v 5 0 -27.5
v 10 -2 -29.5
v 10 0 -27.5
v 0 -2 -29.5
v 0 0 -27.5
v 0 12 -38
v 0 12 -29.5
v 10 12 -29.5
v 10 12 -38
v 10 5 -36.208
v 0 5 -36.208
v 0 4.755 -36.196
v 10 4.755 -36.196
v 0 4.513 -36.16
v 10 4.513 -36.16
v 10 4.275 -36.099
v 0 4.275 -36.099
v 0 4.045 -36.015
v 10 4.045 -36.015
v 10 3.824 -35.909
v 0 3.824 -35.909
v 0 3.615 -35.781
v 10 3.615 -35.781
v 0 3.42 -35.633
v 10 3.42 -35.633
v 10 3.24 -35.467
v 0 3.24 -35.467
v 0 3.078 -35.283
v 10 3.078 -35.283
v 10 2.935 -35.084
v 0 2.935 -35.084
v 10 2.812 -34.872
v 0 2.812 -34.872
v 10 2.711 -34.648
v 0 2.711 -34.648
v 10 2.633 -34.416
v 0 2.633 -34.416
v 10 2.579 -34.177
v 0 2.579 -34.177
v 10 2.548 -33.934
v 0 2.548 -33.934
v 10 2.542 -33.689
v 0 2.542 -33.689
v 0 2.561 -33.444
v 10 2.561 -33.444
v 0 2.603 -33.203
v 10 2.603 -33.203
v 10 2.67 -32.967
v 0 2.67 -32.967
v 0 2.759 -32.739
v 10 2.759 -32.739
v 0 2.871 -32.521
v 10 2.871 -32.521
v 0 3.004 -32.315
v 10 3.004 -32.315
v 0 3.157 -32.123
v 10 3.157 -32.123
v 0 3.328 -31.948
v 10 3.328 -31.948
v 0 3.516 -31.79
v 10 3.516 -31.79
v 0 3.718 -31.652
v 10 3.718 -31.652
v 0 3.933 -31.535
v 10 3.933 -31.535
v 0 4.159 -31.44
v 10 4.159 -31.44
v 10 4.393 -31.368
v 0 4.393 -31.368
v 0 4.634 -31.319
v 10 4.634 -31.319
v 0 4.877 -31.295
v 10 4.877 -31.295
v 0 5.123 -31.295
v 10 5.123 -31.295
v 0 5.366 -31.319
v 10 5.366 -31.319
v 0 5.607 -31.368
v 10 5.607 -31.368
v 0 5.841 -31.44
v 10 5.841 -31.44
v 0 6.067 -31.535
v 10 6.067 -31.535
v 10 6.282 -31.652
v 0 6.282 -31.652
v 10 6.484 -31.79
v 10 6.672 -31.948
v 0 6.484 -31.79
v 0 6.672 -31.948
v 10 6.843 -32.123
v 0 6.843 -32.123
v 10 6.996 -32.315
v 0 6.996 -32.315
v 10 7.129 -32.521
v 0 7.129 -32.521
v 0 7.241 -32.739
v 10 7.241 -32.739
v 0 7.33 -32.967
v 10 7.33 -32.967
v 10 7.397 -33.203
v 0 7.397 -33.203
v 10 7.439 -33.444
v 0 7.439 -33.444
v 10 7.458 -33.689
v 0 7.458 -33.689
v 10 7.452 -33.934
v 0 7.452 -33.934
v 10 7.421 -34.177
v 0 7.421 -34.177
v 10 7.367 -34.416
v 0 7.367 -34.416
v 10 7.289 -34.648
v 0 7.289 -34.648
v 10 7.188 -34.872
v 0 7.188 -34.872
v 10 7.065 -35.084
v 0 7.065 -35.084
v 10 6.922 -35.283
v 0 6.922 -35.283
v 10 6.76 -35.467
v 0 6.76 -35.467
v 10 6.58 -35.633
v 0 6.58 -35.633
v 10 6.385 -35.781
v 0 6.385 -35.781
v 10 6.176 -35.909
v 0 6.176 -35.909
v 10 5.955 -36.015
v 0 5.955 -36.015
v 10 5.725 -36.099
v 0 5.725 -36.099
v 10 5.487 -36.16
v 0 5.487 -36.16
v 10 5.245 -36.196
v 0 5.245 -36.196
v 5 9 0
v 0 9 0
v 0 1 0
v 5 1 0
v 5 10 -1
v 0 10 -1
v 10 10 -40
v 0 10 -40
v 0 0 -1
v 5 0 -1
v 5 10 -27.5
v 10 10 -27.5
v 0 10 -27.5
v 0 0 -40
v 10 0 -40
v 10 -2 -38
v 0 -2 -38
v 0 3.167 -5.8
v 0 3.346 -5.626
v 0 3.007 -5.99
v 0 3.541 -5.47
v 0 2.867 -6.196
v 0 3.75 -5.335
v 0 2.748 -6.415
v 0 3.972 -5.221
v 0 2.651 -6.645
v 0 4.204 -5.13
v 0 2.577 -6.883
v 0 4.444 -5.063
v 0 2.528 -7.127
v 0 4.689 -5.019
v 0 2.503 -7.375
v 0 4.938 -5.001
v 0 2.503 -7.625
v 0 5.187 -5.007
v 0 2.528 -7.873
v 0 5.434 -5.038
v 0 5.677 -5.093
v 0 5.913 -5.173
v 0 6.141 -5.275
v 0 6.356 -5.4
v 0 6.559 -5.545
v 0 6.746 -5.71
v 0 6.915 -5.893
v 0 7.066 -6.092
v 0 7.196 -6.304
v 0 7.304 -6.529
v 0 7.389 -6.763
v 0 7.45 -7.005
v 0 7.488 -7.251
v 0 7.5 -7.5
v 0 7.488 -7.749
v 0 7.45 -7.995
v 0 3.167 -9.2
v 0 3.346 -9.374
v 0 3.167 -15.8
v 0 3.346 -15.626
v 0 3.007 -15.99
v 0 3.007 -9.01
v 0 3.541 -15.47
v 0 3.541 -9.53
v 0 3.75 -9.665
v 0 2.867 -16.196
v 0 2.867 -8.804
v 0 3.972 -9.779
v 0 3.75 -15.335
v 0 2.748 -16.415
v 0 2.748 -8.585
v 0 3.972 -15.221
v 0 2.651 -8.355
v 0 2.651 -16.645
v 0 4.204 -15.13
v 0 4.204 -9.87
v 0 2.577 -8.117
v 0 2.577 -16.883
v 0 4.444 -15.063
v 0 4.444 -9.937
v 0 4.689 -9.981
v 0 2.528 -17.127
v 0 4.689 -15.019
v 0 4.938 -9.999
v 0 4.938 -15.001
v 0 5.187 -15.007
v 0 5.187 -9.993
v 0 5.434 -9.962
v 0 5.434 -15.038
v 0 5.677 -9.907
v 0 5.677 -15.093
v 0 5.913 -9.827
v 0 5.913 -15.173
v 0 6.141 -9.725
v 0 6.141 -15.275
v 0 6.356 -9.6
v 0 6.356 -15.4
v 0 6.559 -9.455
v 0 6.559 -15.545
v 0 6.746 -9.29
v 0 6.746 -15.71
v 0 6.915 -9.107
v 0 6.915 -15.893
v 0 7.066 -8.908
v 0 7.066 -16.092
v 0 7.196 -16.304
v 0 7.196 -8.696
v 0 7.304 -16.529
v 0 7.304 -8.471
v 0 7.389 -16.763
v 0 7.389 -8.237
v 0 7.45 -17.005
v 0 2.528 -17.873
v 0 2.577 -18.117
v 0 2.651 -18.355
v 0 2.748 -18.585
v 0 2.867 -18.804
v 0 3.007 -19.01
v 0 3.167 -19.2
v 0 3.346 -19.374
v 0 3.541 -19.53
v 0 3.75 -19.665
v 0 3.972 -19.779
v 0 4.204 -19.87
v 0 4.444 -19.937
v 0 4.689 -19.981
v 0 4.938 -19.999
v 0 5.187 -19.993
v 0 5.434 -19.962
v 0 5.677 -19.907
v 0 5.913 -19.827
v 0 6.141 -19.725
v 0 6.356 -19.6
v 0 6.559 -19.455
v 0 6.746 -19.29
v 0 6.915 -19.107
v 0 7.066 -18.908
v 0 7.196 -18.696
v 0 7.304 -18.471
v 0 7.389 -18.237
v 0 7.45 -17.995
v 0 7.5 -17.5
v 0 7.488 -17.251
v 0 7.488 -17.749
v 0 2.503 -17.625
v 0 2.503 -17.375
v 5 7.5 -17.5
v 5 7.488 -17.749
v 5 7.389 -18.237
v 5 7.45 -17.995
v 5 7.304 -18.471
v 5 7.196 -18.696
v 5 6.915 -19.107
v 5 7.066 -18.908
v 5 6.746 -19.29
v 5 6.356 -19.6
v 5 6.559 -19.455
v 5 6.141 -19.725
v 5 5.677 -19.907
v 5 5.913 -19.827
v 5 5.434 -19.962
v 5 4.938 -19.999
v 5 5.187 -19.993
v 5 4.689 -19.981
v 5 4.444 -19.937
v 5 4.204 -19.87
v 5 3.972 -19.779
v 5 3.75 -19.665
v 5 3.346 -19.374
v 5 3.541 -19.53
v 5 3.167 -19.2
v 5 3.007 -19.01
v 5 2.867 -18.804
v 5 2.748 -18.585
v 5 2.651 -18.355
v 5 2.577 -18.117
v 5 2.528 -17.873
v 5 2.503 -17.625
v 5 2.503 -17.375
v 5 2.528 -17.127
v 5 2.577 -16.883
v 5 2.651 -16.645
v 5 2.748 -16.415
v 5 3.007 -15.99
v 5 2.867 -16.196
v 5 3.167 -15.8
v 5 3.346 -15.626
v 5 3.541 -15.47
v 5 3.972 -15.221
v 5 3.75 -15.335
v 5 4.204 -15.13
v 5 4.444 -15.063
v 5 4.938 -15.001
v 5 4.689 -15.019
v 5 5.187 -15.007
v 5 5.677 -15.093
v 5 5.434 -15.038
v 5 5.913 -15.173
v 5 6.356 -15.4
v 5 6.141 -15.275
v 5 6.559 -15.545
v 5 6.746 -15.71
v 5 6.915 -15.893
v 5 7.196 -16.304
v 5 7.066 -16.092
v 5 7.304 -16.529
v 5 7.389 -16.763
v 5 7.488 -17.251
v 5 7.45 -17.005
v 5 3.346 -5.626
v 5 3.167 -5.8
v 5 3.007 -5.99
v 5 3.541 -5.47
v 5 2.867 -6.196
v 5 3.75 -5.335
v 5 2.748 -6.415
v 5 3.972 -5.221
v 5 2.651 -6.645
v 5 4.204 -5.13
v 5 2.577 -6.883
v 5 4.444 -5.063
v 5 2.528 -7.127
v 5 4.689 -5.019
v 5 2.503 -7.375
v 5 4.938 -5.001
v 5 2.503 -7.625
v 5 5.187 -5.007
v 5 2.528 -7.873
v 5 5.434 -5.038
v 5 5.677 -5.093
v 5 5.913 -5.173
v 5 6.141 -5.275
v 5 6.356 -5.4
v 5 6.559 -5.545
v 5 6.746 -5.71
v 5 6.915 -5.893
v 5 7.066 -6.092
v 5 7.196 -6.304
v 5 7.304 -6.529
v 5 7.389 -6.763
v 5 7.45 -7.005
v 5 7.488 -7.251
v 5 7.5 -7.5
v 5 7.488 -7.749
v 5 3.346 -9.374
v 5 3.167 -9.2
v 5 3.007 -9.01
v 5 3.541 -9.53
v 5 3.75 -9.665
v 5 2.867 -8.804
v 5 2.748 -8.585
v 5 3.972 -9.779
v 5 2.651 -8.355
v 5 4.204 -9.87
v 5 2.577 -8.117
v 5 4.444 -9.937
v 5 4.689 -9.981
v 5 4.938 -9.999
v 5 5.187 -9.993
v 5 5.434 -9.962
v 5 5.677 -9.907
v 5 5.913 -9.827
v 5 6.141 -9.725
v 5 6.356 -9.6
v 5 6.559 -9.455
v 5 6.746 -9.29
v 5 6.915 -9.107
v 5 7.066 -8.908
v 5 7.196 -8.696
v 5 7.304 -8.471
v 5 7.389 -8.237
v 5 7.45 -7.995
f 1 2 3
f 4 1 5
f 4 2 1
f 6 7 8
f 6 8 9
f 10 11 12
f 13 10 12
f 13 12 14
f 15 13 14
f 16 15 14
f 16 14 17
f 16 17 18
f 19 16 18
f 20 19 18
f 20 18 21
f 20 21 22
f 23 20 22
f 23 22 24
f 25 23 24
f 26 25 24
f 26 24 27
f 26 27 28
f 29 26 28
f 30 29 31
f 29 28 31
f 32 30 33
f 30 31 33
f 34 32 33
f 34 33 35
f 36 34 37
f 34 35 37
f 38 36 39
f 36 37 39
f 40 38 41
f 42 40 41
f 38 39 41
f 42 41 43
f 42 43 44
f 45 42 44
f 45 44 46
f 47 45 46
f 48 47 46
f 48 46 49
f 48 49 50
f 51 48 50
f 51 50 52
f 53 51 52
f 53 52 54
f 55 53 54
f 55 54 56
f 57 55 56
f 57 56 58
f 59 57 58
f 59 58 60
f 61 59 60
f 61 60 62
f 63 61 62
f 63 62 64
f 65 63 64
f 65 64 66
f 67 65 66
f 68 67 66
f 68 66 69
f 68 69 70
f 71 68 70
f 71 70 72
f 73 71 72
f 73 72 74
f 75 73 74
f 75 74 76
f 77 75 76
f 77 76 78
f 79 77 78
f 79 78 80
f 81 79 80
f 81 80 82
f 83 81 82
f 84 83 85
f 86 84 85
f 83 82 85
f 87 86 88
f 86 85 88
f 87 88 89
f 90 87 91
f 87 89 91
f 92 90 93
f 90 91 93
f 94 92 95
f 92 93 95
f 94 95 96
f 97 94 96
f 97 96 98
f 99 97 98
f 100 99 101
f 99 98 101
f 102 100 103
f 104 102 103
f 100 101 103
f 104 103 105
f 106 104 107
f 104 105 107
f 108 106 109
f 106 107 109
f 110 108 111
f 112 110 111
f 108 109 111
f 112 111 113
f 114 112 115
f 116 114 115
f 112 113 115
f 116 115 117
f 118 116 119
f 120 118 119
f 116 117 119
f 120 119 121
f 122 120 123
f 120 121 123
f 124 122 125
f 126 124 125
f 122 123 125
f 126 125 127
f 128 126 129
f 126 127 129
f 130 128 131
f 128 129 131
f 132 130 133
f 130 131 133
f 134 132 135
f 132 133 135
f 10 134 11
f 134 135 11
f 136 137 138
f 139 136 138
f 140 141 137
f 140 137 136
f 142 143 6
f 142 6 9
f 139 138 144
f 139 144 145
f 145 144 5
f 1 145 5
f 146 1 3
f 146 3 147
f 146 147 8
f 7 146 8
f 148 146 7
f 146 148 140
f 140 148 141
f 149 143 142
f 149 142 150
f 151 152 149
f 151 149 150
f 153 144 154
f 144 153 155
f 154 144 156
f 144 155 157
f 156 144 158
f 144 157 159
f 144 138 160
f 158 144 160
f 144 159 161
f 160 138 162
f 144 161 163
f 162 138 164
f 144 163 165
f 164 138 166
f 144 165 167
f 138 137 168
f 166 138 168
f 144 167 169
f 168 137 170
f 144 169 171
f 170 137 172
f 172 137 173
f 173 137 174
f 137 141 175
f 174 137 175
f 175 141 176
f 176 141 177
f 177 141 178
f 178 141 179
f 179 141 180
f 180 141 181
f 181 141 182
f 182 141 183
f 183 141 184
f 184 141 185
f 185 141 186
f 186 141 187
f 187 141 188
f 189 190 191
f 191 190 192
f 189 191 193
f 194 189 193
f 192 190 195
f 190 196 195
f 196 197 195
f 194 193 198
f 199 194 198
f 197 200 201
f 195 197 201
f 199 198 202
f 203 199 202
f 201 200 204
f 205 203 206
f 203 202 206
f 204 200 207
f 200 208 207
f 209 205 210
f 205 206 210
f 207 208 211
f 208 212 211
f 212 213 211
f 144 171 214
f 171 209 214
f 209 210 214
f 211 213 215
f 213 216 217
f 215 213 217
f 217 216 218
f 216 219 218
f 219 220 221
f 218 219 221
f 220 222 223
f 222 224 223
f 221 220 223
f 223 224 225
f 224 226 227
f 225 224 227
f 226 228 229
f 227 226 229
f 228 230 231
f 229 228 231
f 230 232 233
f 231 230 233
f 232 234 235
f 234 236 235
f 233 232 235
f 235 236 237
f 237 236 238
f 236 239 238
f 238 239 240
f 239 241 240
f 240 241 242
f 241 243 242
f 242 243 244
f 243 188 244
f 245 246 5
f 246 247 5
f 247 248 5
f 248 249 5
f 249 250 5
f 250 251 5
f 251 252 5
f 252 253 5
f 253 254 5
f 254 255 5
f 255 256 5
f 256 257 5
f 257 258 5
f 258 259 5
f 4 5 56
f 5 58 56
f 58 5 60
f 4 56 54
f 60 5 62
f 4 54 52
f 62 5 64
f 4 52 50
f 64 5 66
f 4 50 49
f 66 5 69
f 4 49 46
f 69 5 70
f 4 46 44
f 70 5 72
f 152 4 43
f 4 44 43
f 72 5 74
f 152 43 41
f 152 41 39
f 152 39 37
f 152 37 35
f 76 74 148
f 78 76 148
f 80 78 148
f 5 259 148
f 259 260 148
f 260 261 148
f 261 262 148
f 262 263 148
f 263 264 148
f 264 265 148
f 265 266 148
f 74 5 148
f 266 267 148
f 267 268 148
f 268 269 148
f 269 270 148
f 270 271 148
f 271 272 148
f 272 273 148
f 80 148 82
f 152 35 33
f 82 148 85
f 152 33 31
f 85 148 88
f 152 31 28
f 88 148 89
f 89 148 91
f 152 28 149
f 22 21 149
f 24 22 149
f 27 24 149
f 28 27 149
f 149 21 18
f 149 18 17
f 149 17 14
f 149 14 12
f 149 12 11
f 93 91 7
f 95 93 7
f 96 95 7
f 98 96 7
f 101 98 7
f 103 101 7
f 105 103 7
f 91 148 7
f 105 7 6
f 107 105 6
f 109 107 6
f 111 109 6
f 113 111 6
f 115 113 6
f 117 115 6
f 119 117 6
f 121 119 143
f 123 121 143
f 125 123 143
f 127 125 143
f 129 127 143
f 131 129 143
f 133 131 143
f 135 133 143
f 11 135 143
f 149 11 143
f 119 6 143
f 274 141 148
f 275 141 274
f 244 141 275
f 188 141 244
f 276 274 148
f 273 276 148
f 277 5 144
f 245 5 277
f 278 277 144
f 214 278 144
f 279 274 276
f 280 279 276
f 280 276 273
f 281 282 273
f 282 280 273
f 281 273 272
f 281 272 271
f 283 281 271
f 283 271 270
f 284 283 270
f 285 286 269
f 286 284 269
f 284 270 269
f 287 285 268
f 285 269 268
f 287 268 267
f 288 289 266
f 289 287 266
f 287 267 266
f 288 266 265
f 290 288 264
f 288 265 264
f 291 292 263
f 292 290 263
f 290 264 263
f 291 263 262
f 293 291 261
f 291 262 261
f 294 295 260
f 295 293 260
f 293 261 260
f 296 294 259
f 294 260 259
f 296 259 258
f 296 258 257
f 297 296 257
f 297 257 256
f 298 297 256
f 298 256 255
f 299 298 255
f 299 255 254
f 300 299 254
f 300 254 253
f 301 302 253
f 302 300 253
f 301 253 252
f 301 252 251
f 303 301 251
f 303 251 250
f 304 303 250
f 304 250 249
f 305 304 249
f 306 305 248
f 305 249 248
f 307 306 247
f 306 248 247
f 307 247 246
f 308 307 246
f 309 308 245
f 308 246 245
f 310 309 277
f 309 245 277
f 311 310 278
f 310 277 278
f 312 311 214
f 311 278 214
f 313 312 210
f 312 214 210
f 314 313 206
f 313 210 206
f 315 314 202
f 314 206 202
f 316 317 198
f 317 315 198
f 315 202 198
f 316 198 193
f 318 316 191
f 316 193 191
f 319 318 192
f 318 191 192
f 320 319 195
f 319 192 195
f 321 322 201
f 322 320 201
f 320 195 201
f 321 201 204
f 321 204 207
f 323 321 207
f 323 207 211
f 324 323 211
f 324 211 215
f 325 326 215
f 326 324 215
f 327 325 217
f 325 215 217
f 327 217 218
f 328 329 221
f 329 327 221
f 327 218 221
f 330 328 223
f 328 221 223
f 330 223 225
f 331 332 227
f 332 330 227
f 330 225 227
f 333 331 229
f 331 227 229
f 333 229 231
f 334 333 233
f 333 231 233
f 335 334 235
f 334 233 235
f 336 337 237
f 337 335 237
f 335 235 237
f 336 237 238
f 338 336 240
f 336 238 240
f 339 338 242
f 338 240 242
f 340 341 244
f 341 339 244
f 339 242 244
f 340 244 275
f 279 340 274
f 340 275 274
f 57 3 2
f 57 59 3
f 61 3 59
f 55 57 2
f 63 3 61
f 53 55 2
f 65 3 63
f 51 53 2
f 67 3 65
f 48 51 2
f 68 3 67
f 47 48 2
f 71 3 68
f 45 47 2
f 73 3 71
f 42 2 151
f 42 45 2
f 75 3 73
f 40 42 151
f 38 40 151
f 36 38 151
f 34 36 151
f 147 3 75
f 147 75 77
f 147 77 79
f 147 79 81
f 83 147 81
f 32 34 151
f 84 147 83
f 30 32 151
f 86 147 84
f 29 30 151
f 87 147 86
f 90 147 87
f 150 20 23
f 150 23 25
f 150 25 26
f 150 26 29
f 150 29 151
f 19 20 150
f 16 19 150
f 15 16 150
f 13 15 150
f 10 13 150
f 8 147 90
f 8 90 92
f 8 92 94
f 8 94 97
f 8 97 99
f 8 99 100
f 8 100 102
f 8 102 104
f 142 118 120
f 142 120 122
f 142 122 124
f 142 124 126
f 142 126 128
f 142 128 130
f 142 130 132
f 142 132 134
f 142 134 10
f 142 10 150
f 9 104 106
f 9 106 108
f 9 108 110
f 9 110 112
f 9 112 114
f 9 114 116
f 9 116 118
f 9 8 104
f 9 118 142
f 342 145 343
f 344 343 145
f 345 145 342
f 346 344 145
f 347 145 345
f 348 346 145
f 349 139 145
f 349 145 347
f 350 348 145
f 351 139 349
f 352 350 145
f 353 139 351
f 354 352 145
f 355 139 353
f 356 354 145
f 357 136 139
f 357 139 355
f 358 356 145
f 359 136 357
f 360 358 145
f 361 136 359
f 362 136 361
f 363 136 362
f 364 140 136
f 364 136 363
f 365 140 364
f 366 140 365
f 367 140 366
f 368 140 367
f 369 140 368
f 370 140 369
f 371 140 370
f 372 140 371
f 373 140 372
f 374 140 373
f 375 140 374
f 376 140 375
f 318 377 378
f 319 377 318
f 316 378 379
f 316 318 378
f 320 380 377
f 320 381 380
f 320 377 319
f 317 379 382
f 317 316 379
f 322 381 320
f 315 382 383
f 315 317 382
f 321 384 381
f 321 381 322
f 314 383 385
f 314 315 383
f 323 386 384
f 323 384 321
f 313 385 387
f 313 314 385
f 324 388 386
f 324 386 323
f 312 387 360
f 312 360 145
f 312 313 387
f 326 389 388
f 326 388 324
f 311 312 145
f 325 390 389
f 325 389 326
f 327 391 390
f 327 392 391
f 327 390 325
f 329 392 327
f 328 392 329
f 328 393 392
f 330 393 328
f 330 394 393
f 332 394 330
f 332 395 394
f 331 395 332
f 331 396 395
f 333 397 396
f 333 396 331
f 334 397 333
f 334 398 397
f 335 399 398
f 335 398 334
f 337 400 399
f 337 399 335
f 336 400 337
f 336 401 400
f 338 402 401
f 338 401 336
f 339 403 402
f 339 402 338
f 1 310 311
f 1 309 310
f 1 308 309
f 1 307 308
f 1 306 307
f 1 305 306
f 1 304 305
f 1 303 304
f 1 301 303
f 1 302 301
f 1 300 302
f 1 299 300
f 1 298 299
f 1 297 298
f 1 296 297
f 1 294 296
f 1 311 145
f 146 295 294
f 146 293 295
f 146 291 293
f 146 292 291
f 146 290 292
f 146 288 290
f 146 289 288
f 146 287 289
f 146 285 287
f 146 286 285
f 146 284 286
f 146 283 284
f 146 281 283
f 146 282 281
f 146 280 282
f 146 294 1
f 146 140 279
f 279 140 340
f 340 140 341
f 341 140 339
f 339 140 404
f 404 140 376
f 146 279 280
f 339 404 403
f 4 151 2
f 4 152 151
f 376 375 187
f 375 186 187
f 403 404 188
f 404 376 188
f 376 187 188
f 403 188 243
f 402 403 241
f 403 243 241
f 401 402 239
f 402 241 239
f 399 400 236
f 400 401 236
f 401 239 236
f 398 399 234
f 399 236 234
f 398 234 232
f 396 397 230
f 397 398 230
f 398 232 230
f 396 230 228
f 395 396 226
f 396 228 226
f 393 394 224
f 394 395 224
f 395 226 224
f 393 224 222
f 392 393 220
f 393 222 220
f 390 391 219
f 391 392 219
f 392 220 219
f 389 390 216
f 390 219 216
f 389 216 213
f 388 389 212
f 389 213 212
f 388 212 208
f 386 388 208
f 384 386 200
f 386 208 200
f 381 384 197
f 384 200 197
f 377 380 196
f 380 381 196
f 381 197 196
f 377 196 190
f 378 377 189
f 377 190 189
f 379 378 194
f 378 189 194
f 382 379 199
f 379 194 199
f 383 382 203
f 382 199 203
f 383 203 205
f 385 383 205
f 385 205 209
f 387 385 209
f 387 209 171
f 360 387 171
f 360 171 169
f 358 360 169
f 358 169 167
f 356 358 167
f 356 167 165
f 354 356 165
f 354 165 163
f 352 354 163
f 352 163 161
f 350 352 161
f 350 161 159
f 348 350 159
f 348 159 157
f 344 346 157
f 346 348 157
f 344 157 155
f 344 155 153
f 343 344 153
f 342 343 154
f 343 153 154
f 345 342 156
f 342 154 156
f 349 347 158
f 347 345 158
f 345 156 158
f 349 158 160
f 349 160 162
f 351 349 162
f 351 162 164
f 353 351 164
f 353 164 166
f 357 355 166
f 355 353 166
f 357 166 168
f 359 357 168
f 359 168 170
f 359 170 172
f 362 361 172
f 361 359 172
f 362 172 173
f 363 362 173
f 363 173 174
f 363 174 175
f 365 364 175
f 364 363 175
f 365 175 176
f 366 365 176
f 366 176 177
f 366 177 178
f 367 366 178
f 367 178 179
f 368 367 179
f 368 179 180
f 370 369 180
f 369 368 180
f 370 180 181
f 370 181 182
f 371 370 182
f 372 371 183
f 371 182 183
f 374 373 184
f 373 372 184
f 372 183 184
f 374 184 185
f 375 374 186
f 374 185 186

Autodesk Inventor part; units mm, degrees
ref_plane "YZ Plane" through (0, 0, 0) normal (1, 0, 0) x (0, 1, 0)
ref_plane "XZ Plane" through (0, 0, 0) normal (0, 1, 0) x (-1, 0, 0)
ref_plane "XY Plane" through (0, 0, 0) normal (0, 0, 1) x (1, 0, 0)
sketch "Sketch1" plane through (0, 0, 0) normal (1, 0, 0) x (0, 1, 0)
  circle A0 centre (5, -7.5) radius 2.5
  circle A1 centre (5, -17.5) radius 2.5
  line L0 (0, -30) -> (10, -30)
  line L1 (10, -30) -> (10, 0)
  line L2 (10, 0) -> (0, 0)
  line L3 (0, 0) -> (0, -30)
  dimension "d23" = 30
  dimension "d25" = 30
  dimension "d38" = 10
  dimension "d39" = 5
  dimension "d40" = 5
  dimension "d41" = 10
  dimension "d42" = 5
  dimension "d43" = 5
extrude "Extrusion1" add sketch "Sketch1" along normal blind 5
sketch "Sketch2" plane through (0, 0, -30) normal (0, 0, -1) x (-1, 0, 0)
  line L0 (0, 0) -> (0, 10) projected
  line L1 (0, 10) -> (-5, 10) projected
  line L2 (-5, 0) -> (-5, 10) projected
  line L3 (0, 0) -> (-5, 0) projected
extrude "Extrusion2" add sketch "Sketch2" along normal blind 10
sketch "Sketch4" plane through (0, 10, 0) normal (0, 1, 0) x (1, 0, 0)
  line L0 (5, 0) -> (5, 40) projected
  line L1 (0, 40) -> (5, 40) projected
  line L2 (0, 40) -> (5, 40)
  line L3 (5, 40) -> (5, 27.5)
  line L4 (5, 27.5) -> (0, 27.5)
  line L5 (0, 27.5) -> (0, 40)
  dimension "d5" = 12.5
extrude "Extrusion3" add sketch "Sketch4" along normal blind 2
sketch "Sketch5" plane through (0, 0, 0) normal (0, -1, 0) x (1, 0, 0)
  line L0 (5, 0) -> (5, -40) projected
  line L1 (0, -40) -> (5, -40)
  line L2 (5, -40) -> (5, -27.5)
  line L3 (5, -27.5) -> (0, -27.5)
  line L4 (0, -27.5) -> (0, -40)
  dimension "d8" = 12.5
extrude "Extrusion4" add sketch "Sketch5" along normal blind 2
sketch "Sketch6" plane through (5, 0, 0) normal (1, 0, 0) x (0, 0, -1)
  line L0 (27.5, 12) -> (40, 12)
  line L1 (40, 12) -> (40, -2)
  line L2 (40, -2) -> (27.5, -2)
  line L3 (27.5, -2) -> (27.5, 12)
  line L4 (40, -2) -> (40, 12) projected
  line L5 (27.5, 12) -> (40, 12) projected
chamfer "Chamfer3" distance 1 angle 45 2 edges at (2.5, 10, 0) (2.5, 0, 0)
extrude "Extrusion6" add sketch "Sketch6" along normal blind 5
chamfer "Chamfer4" distance 2 angle 45 4 edges at (5, 12, -27.5) (5, 12, -40) (5, -2, -40) (5, -2, -27.5)
sketch "Sketch7" plane through (10, 0, 0) normal (1, 0, 0) x (0, 0, -1)
  line L0 (40, 0) -> (40, 10) projected
  line L1 (38, 12) -> (29.5, 12) projected
  point P0 (0, 0)
  point P1 (33.75, 5)
  dimension "d44" = 7
  dimension "d45" = 6.25
hole "Hole1" at (10, 5, -33.75) direction (-1, 0, 0) diameter 4.917 end through all thread size "M6x1" class "6H" standard "ISO Metric profile"
properties part number "holder"
